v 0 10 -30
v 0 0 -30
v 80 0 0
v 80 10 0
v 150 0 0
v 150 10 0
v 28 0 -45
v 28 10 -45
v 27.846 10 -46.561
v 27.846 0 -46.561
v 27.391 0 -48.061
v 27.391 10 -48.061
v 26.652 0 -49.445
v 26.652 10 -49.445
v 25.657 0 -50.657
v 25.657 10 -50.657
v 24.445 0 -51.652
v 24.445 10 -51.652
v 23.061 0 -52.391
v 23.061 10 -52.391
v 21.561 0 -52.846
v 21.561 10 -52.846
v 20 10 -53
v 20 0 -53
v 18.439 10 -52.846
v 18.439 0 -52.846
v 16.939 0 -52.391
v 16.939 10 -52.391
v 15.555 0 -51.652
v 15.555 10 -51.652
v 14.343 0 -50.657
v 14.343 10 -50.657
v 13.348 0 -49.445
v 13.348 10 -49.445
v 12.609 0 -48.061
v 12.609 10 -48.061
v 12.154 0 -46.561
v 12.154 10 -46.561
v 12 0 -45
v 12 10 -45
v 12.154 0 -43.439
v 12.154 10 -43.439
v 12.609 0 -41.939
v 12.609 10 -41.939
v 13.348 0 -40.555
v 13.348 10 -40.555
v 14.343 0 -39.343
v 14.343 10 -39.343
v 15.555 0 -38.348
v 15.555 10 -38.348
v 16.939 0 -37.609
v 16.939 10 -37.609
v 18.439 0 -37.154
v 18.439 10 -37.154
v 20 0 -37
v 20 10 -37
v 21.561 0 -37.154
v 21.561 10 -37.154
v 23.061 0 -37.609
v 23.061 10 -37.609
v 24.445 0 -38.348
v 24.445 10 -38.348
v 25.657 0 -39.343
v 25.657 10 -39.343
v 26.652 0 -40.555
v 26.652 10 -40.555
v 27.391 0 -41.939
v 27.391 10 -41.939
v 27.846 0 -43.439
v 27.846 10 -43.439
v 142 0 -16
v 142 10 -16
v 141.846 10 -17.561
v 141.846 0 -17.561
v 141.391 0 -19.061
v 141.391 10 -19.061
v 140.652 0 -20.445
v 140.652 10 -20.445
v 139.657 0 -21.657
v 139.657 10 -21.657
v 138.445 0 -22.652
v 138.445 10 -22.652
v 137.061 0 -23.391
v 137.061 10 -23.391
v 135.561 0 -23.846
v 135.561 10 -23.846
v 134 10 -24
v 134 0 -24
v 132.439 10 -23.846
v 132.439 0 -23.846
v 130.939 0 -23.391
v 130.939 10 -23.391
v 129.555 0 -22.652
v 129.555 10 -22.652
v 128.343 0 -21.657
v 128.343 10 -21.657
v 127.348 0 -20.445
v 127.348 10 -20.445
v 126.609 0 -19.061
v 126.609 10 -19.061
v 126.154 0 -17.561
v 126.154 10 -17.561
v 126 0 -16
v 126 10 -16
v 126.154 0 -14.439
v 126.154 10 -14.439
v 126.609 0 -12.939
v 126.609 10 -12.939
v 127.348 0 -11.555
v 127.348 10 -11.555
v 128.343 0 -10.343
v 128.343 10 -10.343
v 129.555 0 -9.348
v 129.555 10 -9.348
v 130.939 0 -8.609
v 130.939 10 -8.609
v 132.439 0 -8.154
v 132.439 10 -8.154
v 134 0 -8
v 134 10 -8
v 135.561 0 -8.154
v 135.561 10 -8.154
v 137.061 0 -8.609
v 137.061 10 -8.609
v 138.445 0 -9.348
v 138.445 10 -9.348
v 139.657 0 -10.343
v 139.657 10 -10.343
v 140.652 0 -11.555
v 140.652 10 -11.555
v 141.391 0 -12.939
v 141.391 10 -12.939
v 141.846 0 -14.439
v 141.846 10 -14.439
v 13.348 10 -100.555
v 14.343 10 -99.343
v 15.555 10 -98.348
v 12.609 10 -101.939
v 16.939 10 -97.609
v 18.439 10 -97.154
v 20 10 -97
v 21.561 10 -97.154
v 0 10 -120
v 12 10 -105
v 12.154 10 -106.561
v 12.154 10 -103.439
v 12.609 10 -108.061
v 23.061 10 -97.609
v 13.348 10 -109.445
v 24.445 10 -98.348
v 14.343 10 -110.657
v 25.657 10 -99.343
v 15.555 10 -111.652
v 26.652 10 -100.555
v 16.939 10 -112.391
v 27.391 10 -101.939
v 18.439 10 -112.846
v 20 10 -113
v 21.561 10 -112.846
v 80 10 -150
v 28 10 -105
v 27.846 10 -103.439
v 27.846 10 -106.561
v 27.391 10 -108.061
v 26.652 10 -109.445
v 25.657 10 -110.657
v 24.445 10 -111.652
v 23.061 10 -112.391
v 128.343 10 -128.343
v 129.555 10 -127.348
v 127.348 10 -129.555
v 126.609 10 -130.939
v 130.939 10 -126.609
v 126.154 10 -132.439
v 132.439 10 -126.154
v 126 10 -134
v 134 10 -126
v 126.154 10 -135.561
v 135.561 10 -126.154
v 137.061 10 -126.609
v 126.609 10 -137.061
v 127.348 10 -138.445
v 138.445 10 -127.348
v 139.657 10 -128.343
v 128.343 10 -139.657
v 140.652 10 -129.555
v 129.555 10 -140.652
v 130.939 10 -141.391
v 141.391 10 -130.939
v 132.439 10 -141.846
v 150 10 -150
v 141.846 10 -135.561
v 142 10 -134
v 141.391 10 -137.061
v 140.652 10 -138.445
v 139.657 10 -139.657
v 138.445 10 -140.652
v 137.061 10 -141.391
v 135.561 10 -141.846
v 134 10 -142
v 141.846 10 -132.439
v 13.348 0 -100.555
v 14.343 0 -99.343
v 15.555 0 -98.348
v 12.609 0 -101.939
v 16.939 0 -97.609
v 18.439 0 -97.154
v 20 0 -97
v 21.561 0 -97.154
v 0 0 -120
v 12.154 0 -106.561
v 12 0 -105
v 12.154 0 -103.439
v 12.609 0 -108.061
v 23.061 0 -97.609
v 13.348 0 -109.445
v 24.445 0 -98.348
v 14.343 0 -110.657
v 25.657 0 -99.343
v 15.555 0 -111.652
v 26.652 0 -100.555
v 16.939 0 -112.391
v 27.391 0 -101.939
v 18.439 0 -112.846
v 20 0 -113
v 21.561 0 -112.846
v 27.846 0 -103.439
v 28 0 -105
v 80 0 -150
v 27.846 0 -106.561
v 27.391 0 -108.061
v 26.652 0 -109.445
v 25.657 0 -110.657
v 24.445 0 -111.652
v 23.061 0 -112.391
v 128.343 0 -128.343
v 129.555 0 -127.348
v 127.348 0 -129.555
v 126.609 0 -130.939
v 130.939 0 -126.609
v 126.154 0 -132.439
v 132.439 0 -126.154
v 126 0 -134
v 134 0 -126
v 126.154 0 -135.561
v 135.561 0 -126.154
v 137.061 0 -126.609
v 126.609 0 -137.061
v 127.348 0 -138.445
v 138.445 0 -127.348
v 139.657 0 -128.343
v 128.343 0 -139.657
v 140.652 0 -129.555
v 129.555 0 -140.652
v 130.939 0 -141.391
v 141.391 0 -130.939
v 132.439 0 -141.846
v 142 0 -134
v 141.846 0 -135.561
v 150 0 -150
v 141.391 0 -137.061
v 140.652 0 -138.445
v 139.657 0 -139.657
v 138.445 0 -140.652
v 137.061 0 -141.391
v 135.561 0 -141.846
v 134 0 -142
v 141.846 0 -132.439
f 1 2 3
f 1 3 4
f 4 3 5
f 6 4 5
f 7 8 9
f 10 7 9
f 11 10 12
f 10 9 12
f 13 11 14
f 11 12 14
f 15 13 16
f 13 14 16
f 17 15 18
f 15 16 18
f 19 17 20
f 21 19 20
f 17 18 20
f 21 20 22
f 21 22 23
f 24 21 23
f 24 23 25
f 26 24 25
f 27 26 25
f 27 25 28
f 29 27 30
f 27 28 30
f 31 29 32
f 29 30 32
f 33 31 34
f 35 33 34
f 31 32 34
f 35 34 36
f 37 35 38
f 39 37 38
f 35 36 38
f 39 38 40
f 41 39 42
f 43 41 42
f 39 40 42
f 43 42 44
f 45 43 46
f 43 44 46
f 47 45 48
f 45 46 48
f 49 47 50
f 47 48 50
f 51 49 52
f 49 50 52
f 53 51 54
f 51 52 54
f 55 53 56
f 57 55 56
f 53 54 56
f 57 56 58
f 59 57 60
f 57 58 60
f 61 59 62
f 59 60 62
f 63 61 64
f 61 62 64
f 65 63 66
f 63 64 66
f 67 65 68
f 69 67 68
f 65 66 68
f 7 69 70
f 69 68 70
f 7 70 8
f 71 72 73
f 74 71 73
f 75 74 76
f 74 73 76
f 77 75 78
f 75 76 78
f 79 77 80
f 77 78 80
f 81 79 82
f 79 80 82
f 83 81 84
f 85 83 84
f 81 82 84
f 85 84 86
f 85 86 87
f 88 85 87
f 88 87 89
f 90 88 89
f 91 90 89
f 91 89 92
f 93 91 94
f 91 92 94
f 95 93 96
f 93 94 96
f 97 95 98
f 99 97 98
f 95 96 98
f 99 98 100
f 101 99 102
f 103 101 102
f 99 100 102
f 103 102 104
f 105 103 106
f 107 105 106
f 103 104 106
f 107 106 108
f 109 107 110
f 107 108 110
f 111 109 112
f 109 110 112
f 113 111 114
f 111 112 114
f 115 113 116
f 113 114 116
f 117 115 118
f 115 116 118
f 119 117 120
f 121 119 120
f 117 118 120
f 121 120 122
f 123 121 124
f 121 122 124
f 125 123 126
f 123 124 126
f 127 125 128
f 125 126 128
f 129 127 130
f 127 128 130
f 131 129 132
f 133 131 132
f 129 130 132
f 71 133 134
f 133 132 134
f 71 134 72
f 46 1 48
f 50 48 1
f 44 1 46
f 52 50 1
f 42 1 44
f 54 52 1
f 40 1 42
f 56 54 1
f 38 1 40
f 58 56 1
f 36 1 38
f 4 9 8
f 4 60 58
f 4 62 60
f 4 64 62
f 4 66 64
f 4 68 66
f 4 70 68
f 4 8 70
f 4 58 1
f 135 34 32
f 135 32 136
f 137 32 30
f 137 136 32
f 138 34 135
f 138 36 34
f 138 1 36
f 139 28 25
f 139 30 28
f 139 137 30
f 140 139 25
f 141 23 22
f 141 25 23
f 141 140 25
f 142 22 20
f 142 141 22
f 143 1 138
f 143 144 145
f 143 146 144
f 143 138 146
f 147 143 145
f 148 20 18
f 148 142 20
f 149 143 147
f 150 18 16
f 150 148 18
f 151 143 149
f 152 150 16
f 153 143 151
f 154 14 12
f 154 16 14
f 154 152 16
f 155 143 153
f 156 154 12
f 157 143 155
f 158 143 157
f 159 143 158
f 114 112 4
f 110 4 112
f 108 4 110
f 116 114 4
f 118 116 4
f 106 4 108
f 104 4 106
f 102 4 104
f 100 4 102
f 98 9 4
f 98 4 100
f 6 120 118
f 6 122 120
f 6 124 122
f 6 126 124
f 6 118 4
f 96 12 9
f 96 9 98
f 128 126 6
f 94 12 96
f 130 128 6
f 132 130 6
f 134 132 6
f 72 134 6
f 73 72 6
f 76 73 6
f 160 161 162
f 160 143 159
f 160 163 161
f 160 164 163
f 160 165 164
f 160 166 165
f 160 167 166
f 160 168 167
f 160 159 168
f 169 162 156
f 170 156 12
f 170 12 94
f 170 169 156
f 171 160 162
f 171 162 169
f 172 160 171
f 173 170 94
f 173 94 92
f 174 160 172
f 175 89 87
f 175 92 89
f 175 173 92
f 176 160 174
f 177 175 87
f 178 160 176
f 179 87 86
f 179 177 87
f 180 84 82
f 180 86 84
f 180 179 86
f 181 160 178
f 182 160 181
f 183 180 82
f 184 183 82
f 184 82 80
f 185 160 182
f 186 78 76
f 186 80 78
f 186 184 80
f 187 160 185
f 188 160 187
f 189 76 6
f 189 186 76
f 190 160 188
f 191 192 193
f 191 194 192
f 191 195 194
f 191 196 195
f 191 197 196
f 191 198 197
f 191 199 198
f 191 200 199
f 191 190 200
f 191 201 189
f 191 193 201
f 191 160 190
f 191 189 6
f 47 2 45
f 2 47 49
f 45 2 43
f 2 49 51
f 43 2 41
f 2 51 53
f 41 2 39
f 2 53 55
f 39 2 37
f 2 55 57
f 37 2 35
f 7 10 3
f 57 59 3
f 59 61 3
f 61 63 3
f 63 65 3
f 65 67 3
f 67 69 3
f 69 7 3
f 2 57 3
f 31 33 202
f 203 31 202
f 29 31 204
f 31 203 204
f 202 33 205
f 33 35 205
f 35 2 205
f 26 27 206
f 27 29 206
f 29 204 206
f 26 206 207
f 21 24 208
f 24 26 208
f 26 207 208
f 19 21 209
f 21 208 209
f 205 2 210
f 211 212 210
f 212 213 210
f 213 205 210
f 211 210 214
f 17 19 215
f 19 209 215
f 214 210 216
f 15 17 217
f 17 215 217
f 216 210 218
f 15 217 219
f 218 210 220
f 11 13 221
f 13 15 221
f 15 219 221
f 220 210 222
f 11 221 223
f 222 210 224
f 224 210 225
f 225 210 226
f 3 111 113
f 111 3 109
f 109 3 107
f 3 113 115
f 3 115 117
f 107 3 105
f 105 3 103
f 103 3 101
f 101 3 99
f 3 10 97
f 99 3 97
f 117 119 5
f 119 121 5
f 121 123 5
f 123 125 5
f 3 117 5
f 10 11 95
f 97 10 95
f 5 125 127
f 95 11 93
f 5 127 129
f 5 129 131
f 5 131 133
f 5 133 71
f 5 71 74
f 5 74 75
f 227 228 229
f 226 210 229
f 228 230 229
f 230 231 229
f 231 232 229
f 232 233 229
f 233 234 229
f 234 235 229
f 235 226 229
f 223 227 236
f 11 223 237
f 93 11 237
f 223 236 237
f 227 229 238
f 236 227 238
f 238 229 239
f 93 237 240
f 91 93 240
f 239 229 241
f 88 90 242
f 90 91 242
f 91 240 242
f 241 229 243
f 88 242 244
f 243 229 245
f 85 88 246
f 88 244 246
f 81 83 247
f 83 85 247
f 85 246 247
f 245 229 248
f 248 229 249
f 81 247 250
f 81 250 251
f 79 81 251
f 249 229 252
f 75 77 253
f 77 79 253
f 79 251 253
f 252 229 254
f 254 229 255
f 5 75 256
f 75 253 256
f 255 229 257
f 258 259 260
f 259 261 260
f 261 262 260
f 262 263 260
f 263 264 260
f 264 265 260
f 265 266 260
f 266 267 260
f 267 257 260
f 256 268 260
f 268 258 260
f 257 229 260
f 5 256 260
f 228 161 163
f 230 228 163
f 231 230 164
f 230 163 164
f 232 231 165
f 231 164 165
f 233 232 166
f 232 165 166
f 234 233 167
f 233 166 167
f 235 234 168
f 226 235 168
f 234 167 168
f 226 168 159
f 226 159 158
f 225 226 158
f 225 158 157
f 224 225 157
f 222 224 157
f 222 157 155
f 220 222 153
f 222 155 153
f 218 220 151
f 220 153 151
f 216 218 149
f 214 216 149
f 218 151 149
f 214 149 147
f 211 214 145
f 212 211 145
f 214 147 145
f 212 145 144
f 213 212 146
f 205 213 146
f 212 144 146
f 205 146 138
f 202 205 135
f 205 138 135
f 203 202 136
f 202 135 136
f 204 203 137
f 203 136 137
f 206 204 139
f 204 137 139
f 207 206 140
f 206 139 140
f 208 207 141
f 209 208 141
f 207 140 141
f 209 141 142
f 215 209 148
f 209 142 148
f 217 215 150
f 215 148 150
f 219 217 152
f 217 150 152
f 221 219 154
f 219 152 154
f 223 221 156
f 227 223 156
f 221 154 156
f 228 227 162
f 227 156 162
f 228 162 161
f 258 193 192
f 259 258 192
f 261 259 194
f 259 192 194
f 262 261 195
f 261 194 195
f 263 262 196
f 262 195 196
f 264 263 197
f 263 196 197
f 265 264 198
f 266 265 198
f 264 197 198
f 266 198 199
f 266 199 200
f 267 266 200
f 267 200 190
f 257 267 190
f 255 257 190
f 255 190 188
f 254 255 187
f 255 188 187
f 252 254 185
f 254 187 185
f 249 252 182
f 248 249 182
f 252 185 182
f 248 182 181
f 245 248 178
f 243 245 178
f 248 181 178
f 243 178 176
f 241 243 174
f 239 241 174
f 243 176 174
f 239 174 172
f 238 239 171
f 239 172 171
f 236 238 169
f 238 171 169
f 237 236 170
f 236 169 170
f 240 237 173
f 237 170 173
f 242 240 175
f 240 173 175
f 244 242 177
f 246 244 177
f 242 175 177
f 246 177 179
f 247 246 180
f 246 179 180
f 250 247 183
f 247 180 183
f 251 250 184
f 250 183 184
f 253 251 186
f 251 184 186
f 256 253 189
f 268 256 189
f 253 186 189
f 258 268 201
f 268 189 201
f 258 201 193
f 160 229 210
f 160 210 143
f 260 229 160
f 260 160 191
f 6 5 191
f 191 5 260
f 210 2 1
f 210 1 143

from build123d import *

# Parameters (mm, degrees)
SKETCH1_W           = 150
SKETCH1_H           = 150
BOSS_EXTRUDE1_DEPTH = 10
CHAMFER1_SIZE       = 30
CHAMFER1_SIZE2      = 80
CHAMFER2_SIZE       = 80
CHAMFER2_SIZE2      = 30
SKETCH2_R           = 8
CUT_EXTRUDE1_DEPTH  = 10


with BuildPart() as part:
    # Sketch1 → Boss-Extrude1 (new body)
    with BuildSketch(Plane(origin=(0, 0, 0), x_dir=(1, 0, 0), z_dir=(0, 1, 0))):
        with Locations((75, 75)):
            Rectangle(SKETCH1_W, SKETCH1_H)
    extrude(amount=BOSS_EXTRUDE1_DEPTH)

    # Chamfer1
    chamfer1_edges = [part.edges().sort_by_distance(p)[0] for p in [
        (0, 5, 0),
    ]]
    chamfer1_side = [part.faces().sort_by_distance(p)[0] for p in [
        (0, 5, -75),
    ]]
    chamfer(chamfer1_edges, length=CHAMFER1_SIZE, length2=CHAMFER1_SIZE2, reference=chamfer1_side[0])

    # Chamfer2
    chamfer2_edges = [part.edges().sort_by_distance(p)[0] for p in [
        (0, 5, -150),
    ]]
    chamfer2_side = [part.faces().sort_by_distance(p)[0] for p in [
        (75, 5, -150),
    ]]
    chamfer(chamfer2_edges, length=CHAMFER2_SIZE, length2=CHAMFER2_SIZE2, reference=chamfer2_side[0])

    # Sketch2 → Cut-Extrude1 (cut)
    with BuildSketch(Plane(origin=(0, 10, 0), x_dir=(1, 0, 0), z_dir=(0, 1, 0))):
        with Locations((134, 134)):
            Circle(SKETCH2_R)
        with Locations((134, 16)):
            Circle(SKETCH2_R)
        with Locations((20, 105)):
            Circle(SKETCH2_R)
        with Locations((20, 45)):
            Circle(SKETCH2_R)
    extrude(amount=-CUT_EXTRUDE1_DEPTH, mode=Mode.SUBTRACT)


solid = part.part
